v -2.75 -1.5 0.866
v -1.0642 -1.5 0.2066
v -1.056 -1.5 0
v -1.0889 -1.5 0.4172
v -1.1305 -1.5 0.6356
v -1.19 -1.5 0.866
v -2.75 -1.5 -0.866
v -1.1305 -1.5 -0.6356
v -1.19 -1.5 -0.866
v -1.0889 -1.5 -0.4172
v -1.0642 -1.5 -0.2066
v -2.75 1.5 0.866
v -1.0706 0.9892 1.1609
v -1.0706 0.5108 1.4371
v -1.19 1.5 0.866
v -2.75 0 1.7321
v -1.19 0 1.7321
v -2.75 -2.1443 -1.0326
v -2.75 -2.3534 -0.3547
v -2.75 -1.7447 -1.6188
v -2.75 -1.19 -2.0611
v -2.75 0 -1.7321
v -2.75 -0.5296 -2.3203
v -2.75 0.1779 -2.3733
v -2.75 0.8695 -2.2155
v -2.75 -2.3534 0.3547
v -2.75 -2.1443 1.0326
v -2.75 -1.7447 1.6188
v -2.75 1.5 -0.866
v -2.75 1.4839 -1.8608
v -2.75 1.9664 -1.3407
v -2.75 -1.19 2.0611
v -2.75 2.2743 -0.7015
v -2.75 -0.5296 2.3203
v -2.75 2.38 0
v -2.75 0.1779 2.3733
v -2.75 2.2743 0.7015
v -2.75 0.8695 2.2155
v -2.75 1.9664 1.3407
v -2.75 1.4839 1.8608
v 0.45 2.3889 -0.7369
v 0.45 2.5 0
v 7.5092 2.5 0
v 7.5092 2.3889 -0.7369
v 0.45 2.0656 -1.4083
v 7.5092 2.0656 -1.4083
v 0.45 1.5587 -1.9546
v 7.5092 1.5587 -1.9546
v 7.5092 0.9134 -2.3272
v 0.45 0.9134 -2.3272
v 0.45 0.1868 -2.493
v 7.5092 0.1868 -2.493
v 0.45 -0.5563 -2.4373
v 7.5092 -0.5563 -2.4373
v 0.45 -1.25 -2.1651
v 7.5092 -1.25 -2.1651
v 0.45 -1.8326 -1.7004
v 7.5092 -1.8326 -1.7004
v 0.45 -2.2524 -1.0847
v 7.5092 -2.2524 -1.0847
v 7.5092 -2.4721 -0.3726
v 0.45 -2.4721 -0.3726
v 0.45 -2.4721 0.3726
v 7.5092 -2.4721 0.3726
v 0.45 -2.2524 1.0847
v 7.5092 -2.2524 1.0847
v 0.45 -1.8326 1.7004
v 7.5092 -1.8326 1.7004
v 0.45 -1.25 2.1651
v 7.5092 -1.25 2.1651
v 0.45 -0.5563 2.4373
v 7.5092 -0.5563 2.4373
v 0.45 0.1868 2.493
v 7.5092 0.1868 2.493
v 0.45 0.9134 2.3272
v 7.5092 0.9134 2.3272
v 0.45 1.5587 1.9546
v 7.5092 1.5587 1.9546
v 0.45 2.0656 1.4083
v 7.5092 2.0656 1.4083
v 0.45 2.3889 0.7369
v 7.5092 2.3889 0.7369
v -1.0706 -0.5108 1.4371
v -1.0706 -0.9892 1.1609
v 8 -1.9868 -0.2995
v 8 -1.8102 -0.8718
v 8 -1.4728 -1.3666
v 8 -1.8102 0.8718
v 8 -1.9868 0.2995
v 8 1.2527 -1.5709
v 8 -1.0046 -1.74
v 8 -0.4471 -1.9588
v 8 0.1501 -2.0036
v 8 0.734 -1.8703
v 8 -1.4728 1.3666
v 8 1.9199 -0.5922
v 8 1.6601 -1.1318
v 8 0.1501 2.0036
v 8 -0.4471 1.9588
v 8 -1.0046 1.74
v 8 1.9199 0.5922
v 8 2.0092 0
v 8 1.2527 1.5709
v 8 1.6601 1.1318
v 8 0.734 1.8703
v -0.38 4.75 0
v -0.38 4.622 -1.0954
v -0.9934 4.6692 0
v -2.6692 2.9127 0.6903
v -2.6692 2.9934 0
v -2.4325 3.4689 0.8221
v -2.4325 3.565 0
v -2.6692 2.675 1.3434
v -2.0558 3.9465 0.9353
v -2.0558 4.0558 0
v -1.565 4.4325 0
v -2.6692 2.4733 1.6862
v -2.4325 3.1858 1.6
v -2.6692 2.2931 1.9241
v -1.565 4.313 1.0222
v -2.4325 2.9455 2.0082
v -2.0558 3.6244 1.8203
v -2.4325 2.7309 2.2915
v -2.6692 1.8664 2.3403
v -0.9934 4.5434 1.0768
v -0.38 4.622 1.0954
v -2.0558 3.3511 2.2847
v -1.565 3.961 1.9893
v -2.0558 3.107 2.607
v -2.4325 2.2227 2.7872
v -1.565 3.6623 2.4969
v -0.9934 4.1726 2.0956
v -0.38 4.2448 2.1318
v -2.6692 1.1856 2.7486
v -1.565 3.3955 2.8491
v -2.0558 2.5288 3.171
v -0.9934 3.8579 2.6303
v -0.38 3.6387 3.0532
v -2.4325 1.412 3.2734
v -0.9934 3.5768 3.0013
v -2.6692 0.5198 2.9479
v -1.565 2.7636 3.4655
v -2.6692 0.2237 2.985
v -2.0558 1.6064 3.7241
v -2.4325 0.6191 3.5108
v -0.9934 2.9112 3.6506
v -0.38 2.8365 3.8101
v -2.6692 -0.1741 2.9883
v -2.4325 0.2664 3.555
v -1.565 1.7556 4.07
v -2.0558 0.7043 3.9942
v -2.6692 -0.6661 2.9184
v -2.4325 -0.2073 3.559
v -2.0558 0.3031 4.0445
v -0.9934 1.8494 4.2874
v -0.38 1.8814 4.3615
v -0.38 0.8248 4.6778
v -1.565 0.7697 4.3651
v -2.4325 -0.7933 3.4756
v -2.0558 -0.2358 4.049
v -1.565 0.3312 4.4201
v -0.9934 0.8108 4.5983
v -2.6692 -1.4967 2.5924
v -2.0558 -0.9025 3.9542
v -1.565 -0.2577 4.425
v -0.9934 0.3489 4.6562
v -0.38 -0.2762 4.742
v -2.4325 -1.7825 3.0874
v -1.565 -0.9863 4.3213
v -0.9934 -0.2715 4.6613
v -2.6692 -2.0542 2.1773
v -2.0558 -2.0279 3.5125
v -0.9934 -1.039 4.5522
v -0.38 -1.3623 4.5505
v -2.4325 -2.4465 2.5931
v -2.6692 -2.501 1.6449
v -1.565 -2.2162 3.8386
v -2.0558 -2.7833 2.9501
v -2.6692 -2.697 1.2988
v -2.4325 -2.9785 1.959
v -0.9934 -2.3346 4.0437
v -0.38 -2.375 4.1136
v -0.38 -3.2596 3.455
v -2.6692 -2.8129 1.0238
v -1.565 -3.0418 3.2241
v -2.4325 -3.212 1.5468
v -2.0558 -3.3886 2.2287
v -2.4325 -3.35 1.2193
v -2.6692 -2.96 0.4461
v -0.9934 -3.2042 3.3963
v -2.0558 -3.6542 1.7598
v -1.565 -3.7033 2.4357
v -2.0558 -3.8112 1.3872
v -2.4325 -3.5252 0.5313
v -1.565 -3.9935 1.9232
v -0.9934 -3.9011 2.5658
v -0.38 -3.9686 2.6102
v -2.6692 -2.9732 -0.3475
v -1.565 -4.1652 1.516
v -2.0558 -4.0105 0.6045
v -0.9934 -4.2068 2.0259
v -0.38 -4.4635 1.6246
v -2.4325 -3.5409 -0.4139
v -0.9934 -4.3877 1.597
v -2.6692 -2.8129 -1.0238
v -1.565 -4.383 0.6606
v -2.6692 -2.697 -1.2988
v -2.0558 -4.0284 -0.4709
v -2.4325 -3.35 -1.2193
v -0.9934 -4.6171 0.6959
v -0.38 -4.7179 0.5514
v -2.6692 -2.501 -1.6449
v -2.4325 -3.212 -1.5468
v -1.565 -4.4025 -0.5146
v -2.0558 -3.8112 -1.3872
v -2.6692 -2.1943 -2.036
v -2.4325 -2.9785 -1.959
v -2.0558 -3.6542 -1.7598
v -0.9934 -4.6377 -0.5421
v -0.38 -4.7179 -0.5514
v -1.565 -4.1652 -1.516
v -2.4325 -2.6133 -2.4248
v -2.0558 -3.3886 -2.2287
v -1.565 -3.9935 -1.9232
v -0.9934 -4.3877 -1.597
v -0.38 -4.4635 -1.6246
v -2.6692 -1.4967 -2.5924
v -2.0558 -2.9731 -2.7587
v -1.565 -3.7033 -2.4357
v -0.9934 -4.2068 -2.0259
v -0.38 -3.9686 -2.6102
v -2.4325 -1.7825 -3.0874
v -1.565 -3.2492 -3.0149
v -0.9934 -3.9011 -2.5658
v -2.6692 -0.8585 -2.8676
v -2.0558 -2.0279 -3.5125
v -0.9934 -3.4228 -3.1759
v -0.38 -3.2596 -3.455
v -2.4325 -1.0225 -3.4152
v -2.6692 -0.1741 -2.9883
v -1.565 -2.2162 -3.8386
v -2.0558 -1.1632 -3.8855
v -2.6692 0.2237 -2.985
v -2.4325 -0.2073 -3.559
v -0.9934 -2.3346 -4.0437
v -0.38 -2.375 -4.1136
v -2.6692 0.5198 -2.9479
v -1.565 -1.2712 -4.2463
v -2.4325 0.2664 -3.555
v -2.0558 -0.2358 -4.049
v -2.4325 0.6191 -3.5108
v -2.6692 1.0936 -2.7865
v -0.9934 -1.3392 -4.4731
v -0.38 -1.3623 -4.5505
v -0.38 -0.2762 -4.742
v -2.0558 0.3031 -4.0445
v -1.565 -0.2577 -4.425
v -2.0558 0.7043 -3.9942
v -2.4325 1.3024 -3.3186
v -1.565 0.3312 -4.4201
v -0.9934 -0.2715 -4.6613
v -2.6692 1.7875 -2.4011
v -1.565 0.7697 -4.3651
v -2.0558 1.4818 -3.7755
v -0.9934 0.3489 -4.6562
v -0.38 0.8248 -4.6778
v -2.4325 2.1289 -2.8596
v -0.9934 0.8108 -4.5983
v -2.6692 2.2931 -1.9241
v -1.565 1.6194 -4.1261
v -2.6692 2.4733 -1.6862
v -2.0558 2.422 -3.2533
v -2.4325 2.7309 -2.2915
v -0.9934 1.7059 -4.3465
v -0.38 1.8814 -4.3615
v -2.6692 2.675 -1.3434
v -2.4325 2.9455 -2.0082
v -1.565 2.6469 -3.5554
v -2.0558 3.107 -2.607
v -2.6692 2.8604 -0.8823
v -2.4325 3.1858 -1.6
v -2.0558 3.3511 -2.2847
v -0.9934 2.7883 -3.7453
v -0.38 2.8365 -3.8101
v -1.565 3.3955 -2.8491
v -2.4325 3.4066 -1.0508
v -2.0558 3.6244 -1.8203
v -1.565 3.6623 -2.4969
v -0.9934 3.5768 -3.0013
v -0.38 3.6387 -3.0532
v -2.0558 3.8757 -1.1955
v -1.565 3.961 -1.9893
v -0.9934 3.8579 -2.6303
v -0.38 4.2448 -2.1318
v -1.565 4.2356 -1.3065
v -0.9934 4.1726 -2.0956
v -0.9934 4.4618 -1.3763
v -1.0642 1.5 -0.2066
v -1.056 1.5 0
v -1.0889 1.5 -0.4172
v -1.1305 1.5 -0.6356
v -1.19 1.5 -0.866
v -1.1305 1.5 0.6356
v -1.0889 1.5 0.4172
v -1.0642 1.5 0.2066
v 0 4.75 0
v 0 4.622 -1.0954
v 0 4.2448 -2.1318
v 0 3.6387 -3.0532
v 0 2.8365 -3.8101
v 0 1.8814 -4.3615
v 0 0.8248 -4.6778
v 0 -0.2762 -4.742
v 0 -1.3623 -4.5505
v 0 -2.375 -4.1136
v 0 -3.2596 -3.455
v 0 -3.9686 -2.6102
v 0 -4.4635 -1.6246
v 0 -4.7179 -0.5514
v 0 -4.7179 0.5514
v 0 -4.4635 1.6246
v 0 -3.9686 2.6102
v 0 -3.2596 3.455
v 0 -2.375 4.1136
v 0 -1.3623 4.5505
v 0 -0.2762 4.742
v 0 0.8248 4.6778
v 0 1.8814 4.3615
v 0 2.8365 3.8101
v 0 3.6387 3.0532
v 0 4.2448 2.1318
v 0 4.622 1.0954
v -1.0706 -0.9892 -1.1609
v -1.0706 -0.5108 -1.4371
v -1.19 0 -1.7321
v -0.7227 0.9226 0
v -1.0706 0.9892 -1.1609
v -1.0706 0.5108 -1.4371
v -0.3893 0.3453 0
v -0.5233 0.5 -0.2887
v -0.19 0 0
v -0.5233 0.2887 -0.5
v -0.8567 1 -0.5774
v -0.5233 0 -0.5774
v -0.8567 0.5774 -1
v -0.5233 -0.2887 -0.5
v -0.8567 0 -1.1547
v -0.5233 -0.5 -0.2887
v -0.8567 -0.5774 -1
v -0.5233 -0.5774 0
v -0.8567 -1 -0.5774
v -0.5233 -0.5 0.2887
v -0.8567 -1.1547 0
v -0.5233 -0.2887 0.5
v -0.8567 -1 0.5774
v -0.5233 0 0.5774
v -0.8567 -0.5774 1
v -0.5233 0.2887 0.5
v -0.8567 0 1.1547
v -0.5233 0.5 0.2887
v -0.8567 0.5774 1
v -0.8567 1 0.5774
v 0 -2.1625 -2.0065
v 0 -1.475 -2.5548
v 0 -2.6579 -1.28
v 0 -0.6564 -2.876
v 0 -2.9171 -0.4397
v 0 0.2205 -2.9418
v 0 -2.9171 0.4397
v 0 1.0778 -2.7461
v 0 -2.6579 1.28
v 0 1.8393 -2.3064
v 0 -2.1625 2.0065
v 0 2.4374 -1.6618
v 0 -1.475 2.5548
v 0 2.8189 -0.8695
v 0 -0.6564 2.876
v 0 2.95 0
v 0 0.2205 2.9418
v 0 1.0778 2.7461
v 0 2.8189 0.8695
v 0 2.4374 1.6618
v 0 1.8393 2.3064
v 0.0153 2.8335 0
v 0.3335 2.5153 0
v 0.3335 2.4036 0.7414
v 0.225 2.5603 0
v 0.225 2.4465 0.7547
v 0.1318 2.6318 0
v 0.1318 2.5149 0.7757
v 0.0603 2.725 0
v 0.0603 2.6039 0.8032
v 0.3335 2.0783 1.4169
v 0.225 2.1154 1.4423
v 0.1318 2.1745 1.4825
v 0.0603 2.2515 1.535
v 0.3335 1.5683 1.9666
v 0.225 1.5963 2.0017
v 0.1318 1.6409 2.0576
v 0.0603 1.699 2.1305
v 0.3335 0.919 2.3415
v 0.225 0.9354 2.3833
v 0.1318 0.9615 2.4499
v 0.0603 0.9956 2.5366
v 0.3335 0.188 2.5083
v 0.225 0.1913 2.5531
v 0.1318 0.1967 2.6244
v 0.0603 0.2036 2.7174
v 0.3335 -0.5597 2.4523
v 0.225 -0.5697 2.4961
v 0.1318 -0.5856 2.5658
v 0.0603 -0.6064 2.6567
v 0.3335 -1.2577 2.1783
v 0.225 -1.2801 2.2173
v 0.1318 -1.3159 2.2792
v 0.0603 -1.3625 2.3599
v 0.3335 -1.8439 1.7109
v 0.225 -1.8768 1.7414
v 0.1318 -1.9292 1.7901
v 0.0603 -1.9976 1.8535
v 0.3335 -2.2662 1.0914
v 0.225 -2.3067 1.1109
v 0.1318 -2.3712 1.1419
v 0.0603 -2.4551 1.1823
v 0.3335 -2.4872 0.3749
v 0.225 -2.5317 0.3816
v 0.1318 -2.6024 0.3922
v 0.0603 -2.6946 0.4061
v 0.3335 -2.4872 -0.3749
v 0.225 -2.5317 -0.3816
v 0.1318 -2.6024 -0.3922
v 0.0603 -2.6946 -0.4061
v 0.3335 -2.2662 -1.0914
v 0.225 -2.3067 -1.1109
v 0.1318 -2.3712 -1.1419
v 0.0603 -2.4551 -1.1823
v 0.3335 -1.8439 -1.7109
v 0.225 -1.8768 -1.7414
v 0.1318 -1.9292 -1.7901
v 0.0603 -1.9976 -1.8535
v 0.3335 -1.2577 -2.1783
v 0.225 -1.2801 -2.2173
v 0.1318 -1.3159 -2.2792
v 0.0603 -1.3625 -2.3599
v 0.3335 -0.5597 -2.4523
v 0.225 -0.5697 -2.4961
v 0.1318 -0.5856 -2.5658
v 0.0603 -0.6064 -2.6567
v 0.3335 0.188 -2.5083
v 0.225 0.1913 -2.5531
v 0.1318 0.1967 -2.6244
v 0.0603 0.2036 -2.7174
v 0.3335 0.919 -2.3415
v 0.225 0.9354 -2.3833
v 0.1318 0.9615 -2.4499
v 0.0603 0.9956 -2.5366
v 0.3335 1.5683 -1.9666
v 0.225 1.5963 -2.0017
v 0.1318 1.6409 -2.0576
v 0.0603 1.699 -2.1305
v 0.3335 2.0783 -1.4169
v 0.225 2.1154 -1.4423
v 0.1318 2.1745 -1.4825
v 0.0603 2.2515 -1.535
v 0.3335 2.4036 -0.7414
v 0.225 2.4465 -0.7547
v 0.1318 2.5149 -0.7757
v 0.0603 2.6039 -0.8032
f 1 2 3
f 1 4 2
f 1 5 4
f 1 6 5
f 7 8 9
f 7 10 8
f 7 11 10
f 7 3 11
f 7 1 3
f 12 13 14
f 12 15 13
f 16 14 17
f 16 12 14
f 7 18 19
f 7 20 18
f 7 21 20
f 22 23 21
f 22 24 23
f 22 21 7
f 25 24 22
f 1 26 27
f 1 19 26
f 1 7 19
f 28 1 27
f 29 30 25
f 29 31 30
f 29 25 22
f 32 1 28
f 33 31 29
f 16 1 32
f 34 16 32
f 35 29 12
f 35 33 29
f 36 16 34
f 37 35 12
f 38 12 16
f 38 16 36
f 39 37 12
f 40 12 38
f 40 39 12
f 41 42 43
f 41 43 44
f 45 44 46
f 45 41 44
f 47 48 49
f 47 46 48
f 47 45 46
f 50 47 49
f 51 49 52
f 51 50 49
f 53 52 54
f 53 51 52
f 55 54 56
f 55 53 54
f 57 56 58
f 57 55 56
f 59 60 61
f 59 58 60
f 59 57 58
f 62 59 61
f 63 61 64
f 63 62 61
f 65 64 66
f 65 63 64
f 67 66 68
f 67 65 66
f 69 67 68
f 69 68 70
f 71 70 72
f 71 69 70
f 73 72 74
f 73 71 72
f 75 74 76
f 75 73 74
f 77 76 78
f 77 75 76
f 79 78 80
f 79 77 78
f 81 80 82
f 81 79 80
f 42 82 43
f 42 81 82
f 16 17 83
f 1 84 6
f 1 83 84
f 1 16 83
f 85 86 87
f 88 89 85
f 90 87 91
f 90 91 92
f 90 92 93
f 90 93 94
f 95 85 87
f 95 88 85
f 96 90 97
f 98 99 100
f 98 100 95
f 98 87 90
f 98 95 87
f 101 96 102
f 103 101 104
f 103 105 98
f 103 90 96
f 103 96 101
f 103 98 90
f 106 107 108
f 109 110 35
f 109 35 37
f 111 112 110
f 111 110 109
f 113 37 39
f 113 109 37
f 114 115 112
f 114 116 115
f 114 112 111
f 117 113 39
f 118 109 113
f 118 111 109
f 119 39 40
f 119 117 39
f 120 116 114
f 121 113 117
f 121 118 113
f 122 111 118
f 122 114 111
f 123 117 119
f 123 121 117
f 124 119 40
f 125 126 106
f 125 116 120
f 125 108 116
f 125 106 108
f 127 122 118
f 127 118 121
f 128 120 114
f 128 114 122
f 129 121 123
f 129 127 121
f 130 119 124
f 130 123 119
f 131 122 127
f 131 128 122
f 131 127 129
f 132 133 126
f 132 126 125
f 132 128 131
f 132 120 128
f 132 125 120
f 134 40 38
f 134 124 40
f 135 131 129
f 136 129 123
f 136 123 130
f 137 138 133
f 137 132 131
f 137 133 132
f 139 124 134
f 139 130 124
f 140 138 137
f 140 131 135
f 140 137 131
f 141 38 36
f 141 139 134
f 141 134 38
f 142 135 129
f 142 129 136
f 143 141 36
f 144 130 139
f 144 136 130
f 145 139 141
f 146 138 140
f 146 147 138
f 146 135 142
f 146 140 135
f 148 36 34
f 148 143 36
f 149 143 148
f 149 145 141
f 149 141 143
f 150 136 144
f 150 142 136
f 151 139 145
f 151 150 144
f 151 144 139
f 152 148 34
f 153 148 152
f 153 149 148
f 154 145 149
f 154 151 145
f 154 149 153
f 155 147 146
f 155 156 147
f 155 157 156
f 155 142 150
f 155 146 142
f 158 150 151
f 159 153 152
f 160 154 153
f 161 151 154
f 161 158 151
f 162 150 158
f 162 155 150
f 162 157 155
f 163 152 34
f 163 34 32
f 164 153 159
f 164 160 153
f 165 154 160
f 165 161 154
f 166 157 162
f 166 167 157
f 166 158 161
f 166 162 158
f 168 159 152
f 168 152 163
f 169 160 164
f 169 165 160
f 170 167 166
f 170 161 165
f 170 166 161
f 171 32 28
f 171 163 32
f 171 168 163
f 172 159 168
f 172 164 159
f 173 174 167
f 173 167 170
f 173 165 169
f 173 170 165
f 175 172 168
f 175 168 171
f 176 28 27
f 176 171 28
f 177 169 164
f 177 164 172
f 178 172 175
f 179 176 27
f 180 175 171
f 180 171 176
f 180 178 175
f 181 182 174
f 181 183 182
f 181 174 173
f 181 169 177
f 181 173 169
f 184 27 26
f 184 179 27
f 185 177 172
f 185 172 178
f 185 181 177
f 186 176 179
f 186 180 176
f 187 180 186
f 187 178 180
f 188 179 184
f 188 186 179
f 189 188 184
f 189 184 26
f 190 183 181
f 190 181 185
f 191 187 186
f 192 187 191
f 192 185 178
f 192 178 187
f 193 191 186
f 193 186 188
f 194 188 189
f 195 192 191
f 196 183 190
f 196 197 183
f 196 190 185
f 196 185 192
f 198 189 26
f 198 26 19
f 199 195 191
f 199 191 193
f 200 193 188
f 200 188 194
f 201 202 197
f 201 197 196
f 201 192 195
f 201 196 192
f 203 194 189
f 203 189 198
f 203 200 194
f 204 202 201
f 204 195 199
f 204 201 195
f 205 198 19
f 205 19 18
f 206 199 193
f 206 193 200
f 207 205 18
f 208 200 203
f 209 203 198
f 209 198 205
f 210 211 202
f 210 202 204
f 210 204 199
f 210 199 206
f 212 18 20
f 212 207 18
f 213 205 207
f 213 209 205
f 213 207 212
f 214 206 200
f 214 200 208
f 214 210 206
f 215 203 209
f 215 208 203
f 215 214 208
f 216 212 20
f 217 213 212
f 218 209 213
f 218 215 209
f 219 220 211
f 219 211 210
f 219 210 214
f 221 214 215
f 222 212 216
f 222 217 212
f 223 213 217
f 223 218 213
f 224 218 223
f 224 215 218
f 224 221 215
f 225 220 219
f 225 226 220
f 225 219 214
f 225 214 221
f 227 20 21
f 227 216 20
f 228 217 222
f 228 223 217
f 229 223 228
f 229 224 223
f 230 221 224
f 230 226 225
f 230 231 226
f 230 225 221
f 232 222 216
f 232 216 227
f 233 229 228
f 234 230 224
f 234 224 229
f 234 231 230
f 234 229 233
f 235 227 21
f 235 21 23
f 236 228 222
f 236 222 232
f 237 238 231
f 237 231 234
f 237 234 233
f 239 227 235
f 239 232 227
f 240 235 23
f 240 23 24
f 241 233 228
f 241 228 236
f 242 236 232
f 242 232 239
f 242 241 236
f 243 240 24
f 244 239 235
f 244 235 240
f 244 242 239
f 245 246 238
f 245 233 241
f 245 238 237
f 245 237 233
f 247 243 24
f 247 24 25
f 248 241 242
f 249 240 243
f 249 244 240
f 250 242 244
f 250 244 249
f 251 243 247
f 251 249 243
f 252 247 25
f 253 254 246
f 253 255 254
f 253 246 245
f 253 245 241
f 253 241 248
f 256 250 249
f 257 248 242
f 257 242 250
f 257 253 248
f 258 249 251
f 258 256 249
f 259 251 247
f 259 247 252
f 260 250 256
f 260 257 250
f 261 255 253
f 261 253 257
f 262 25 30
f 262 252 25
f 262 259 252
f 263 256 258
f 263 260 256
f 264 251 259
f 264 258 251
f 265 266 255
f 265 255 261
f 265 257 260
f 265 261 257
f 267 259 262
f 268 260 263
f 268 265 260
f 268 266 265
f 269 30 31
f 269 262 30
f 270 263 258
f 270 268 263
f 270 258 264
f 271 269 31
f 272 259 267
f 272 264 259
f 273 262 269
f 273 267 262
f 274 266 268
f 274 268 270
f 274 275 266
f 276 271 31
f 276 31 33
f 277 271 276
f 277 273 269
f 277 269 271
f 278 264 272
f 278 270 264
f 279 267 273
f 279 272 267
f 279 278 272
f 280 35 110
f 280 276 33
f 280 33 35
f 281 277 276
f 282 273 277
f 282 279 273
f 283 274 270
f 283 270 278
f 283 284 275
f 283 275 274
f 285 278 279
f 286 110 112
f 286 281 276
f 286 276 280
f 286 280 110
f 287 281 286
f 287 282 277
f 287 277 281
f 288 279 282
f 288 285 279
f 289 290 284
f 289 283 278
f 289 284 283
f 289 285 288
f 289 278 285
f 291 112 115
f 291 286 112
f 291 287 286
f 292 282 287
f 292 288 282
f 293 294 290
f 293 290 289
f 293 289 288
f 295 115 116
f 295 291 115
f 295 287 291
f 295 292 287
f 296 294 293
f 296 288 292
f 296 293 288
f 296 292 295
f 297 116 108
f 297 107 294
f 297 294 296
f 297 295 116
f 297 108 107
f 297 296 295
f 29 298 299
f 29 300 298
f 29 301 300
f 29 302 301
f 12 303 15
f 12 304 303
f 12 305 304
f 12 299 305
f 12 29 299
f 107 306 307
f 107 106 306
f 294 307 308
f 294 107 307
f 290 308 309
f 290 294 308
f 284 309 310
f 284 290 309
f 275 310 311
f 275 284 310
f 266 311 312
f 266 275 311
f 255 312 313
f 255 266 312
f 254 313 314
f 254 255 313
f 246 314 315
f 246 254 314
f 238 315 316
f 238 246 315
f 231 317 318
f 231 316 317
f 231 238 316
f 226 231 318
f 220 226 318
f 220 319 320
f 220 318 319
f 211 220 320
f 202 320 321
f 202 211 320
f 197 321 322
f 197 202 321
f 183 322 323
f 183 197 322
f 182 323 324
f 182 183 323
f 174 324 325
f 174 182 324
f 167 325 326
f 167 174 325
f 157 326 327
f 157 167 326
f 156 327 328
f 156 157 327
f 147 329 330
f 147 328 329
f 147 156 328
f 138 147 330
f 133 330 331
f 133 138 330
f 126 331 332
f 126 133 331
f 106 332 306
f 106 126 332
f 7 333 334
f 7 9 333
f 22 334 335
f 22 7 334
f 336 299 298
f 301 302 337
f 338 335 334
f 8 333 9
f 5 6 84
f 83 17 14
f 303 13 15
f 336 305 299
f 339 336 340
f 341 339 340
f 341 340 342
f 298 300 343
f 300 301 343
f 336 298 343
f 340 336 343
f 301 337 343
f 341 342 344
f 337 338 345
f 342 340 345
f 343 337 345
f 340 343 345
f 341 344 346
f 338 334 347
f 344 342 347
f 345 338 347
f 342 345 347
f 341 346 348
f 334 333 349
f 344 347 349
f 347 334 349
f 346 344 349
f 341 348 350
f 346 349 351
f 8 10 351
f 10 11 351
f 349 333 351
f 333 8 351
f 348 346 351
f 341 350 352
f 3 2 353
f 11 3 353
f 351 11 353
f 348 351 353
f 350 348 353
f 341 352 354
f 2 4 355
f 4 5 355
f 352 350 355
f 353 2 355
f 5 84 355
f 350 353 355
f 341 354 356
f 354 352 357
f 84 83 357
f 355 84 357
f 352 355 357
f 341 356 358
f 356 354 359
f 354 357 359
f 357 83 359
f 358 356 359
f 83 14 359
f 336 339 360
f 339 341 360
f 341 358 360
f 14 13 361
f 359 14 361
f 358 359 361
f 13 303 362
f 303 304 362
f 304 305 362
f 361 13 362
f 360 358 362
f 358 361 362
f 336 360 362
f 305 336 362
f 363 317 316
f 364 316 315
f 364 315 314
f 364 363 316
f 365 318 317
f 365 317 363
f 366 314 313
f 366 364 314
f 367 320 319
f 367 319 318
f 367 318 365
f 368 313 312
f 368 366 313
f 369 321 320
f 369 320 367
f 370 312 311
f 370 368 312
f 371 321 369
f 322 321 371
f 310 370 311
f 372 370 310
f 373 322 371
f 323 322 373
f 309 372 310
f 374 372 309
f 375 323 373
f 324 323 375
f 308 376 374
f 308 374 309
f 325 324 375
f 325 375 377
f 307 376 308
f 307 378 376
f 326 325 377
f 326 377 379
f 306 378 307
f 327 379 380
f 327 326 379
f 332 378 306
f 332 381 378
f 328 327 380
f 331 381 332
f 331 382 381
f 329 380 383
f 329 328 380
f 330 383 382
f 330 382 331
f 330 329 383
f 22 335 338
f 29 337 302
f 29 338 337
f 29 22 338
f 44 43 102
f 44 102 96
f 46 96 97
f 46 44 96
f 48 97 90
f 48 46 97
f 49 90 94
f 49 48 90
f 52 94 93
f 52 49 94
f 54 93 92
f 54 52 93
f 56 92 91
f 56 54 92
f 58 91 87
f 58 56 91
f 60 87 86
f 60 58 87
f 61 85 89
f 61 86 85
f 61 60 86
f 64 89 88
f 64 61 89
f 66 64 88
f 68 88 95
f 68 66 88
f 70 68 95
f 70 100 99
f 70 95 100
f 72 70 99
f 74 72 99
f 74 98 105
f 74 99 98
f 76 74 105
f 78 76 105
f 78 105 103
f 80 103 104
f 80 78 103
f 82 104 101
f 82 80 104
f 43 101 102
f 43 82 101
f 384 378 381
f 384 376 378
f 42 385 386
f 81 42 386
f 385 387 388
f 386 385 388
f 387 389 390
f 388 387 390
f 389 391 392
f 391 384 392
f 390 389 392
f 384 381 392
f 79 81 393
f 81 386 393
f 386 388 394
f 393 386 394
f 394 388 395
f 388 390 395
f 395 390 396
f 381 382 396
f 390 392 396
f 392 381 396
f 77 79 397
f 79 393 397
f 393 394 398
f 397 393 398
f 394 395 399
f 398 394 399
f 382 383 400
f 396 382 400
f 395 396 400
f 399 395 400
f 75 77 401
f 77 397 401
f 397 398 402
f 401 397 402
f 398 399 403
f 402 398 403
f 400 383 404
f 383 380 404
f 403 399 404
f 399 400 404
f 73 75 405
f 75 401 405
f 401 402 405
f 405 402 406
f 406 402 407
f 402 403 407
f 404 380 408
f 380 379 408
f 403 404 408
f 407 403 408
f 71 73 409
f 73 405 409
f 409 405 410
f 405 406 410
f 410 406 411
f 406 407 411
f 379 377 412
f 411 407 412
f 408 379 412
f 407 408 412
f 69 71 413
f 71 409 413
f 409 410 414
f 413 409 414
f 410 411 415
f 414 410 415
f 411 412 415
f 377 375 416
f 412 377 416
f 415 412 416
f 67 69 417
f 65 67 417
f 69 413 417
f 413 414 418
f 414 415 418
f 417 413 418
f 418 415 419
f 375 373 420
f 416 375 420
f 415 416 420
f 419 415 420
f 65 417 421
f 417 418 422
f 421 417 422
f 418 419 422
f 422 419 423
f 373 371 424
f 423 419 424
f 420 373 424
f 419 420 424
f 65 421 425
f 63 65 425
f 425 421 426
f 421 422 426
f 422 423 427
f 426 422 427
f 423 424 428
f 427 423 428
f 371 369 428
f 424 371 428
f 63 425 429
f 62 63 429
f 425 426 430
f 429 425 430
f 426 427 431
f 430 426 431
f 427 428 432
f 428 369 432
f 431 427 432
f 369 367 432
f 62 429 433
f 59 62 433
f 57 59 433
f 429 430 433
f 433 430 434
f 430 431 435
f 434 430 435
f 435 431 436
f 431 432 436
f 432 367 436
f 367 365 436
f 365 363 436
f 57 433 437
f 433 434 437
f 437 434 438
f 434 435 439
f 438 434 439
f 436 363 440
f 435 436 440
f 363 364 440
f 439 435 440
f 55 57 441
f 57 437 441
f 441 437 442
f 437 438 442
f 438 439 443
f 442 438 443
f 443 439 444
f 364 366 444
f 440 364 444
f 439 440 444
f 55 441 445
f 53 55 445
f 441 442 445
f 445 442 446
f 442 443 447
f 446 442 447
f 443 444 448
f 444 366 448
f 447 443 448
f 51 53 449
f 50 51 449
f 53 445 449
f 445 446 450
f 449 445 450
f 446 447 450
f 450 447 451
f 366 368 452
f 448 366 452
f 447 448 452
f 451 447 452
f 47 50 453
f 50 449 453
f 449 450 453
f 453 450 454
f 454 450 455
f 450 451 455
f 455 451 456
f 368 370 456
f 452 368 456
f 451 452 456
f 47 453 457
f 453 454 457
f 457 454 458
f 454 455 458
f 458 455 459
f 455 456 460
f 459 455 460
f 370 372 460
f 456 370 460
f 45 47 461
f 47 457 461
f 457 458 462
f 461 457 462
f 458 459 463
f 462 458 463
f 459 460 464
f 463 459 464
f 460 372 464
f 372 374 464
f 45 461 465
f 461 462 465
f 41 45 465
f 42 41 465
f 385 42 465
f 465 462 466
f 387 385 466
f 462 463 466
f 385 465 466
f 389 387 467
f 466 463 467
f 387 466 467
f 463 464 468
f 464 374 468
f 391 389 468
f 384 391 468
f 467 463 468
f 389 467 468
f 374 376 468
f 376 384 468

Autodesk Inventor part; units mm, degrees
ref_plane "YZ Plane" through (0, 0, 0) normal (1, 0, 0) x (0, 1, 0)
ref_plane "XZ Plane" through (0, 0, 0) normal (0, 1, 0) x (-1, 0, 0)
sketch "Sketch1" plane through (0, 0, 0) normal (0, 0, 1) x (1, 0, 0)
  line L0 (-0.19, 0) -> (8, 0)
  line L1 (8, 0) -> (8, 2.5)
  line L2 (8, 2.5) -> (2.4, 2.5)
  line L3 (2.4, 2.5) -> (1.9091, 2.5)
  line L4 (1.9091, 2.5) -> (0, 2.5)
  line L5 (0, 2.5) -> (0, 4.75)
  line L6 (0, 4.75) -> (-2.75, 4.75)
  line L7 (-2.75, 4.75) -> (-2.75, 1.7321)
  line L8 (-2.75, 1.7321) -> (-1.19, 1.7321)
  line L9 (-1.19, 1.7321) -> (-0.19, 0)
  line L10 (-4.9, 0) -> (10.15, 0) projected
  line L11 (0, -0.95) -> (0, 5.7) projected
  line L12 (2.4, 2.5) -> (0, 2.5) construction
  dimension "d1" = 5.6
  dimension "d2" = 0.4909
  dimension "d3" = 2.75
  dimension "d4" = 1.56
  dimension "d5" = 60
  dimension "d6" = 5
  dimension "d7" = 5
  dimension "d8" = 3.4641
  dimension "d9" = 9.5
  dimension "d26" = 8
revolve "Body" add sketch "Sketch1" angle 360 about axis through (-0.19, 0, 0) along (1, 0, 0)
sketch "Sketch2" plane through (-2.75, 0, 0) normal (-1, 0, 0) x (0, 0, 1)
  circle A0 centre (0, 0) radius 1.7321 projected
  line L0 (0, -6.65) -> (0, 6.65) projected
  line L1 (-6.65, 0) -> (6.65, 0) projected
  line L2 (1.7321, 0) -> (0.866, -1.5)
  line L3 (0.866, -1.5) -> (-0.866, -1.5)
  line L4 (-0.866, -1.5) -> (-1.7321, 0)
  line L5 (-1.7321, 0) -> (-0.866, 1.5)
  line L6 (-0.866, 1.5) -> (0.866, 1.5)
  line L7 (0.866, 1.5) -> (1.7321, 0)
extrude "Slot" add sketch "Sketch2" against normal up to next contours L7 A0 | A0 L2 | L6 L0 A0 | A0 L0 L3 | L0 L6 A0 | A0 L3 L0 | L4 A0 | A0 L5
fillet "Fillet1" radius 2.37 1 edges at (-2.75, -4.75, 0)
thread "Thread" size "M5x0.8" class "6g" standard "ISO Metric profile" length 5.6
chamfer "Chamfer1" distance 0.4908 distance2 0.4908 1 edges at (8, -2.5, 0) measured on face at (8, -0.6238, -0.819)
ref_plane "Work Plane1" through (29, 0, 0) normal (0, -1, 0) x (1, 0, 0)
fillet "Fillet2" radius 0.45 1 edges at (0, -2.5, 0)
equation "\"d30\" = R"
equation "\"d17\" = RR"
equation "\"d13\" = GEL"
equation "\"d15\" = -0.5 * SPD + 0.5 * GD"
equation "\"d16\" = GUL"
equation "\"d1\" = GEL"
equation "\"d3\" = KOH"
equation "\"d4\" = INTI"
equation "\"d6\" = GD"
equation "\"d7\" = BDM"
equation "\"d8\" = 1.1547 * SW"
equation "\"d9\" = KOD"
equation "\"d26\" = NLG"
equation "\"GD\" = NND"
equation "\"NLG\" = 8"
equation "\"GEL\" = 5.6"
equation "\"KOD\" = 9.5"
equation "\"KOH\" = 2.75"
equation "\"INTI\" = 1.56"
equation "\"GAL\" = 0.61345 * PTC"
equation "\"GUL\" = 0.61345 * PTC"
equation "\"BDM\" = NND"
equation "\"SW\" = 3"
equation "\"RR\" = 2.37"
equation "\"SPD\" = NND - 1.2269 * PTC"
equation "\"R\" = 0.45"
equation "\"TOA\" = 30deg"
equation "\"GD1\" = THREADDIA - 1.2269 * PTC"
equation "\"THREADDIA\" = 5"
equation "\"PTC\" = 0.8"
equation "\"NND\" = 5"
equation "\"KOH1\" = 0.38"
equation "\"E0\" = 3.443"
properties part number "ISO 7380-1 - M5 x 8" material "Steel"
